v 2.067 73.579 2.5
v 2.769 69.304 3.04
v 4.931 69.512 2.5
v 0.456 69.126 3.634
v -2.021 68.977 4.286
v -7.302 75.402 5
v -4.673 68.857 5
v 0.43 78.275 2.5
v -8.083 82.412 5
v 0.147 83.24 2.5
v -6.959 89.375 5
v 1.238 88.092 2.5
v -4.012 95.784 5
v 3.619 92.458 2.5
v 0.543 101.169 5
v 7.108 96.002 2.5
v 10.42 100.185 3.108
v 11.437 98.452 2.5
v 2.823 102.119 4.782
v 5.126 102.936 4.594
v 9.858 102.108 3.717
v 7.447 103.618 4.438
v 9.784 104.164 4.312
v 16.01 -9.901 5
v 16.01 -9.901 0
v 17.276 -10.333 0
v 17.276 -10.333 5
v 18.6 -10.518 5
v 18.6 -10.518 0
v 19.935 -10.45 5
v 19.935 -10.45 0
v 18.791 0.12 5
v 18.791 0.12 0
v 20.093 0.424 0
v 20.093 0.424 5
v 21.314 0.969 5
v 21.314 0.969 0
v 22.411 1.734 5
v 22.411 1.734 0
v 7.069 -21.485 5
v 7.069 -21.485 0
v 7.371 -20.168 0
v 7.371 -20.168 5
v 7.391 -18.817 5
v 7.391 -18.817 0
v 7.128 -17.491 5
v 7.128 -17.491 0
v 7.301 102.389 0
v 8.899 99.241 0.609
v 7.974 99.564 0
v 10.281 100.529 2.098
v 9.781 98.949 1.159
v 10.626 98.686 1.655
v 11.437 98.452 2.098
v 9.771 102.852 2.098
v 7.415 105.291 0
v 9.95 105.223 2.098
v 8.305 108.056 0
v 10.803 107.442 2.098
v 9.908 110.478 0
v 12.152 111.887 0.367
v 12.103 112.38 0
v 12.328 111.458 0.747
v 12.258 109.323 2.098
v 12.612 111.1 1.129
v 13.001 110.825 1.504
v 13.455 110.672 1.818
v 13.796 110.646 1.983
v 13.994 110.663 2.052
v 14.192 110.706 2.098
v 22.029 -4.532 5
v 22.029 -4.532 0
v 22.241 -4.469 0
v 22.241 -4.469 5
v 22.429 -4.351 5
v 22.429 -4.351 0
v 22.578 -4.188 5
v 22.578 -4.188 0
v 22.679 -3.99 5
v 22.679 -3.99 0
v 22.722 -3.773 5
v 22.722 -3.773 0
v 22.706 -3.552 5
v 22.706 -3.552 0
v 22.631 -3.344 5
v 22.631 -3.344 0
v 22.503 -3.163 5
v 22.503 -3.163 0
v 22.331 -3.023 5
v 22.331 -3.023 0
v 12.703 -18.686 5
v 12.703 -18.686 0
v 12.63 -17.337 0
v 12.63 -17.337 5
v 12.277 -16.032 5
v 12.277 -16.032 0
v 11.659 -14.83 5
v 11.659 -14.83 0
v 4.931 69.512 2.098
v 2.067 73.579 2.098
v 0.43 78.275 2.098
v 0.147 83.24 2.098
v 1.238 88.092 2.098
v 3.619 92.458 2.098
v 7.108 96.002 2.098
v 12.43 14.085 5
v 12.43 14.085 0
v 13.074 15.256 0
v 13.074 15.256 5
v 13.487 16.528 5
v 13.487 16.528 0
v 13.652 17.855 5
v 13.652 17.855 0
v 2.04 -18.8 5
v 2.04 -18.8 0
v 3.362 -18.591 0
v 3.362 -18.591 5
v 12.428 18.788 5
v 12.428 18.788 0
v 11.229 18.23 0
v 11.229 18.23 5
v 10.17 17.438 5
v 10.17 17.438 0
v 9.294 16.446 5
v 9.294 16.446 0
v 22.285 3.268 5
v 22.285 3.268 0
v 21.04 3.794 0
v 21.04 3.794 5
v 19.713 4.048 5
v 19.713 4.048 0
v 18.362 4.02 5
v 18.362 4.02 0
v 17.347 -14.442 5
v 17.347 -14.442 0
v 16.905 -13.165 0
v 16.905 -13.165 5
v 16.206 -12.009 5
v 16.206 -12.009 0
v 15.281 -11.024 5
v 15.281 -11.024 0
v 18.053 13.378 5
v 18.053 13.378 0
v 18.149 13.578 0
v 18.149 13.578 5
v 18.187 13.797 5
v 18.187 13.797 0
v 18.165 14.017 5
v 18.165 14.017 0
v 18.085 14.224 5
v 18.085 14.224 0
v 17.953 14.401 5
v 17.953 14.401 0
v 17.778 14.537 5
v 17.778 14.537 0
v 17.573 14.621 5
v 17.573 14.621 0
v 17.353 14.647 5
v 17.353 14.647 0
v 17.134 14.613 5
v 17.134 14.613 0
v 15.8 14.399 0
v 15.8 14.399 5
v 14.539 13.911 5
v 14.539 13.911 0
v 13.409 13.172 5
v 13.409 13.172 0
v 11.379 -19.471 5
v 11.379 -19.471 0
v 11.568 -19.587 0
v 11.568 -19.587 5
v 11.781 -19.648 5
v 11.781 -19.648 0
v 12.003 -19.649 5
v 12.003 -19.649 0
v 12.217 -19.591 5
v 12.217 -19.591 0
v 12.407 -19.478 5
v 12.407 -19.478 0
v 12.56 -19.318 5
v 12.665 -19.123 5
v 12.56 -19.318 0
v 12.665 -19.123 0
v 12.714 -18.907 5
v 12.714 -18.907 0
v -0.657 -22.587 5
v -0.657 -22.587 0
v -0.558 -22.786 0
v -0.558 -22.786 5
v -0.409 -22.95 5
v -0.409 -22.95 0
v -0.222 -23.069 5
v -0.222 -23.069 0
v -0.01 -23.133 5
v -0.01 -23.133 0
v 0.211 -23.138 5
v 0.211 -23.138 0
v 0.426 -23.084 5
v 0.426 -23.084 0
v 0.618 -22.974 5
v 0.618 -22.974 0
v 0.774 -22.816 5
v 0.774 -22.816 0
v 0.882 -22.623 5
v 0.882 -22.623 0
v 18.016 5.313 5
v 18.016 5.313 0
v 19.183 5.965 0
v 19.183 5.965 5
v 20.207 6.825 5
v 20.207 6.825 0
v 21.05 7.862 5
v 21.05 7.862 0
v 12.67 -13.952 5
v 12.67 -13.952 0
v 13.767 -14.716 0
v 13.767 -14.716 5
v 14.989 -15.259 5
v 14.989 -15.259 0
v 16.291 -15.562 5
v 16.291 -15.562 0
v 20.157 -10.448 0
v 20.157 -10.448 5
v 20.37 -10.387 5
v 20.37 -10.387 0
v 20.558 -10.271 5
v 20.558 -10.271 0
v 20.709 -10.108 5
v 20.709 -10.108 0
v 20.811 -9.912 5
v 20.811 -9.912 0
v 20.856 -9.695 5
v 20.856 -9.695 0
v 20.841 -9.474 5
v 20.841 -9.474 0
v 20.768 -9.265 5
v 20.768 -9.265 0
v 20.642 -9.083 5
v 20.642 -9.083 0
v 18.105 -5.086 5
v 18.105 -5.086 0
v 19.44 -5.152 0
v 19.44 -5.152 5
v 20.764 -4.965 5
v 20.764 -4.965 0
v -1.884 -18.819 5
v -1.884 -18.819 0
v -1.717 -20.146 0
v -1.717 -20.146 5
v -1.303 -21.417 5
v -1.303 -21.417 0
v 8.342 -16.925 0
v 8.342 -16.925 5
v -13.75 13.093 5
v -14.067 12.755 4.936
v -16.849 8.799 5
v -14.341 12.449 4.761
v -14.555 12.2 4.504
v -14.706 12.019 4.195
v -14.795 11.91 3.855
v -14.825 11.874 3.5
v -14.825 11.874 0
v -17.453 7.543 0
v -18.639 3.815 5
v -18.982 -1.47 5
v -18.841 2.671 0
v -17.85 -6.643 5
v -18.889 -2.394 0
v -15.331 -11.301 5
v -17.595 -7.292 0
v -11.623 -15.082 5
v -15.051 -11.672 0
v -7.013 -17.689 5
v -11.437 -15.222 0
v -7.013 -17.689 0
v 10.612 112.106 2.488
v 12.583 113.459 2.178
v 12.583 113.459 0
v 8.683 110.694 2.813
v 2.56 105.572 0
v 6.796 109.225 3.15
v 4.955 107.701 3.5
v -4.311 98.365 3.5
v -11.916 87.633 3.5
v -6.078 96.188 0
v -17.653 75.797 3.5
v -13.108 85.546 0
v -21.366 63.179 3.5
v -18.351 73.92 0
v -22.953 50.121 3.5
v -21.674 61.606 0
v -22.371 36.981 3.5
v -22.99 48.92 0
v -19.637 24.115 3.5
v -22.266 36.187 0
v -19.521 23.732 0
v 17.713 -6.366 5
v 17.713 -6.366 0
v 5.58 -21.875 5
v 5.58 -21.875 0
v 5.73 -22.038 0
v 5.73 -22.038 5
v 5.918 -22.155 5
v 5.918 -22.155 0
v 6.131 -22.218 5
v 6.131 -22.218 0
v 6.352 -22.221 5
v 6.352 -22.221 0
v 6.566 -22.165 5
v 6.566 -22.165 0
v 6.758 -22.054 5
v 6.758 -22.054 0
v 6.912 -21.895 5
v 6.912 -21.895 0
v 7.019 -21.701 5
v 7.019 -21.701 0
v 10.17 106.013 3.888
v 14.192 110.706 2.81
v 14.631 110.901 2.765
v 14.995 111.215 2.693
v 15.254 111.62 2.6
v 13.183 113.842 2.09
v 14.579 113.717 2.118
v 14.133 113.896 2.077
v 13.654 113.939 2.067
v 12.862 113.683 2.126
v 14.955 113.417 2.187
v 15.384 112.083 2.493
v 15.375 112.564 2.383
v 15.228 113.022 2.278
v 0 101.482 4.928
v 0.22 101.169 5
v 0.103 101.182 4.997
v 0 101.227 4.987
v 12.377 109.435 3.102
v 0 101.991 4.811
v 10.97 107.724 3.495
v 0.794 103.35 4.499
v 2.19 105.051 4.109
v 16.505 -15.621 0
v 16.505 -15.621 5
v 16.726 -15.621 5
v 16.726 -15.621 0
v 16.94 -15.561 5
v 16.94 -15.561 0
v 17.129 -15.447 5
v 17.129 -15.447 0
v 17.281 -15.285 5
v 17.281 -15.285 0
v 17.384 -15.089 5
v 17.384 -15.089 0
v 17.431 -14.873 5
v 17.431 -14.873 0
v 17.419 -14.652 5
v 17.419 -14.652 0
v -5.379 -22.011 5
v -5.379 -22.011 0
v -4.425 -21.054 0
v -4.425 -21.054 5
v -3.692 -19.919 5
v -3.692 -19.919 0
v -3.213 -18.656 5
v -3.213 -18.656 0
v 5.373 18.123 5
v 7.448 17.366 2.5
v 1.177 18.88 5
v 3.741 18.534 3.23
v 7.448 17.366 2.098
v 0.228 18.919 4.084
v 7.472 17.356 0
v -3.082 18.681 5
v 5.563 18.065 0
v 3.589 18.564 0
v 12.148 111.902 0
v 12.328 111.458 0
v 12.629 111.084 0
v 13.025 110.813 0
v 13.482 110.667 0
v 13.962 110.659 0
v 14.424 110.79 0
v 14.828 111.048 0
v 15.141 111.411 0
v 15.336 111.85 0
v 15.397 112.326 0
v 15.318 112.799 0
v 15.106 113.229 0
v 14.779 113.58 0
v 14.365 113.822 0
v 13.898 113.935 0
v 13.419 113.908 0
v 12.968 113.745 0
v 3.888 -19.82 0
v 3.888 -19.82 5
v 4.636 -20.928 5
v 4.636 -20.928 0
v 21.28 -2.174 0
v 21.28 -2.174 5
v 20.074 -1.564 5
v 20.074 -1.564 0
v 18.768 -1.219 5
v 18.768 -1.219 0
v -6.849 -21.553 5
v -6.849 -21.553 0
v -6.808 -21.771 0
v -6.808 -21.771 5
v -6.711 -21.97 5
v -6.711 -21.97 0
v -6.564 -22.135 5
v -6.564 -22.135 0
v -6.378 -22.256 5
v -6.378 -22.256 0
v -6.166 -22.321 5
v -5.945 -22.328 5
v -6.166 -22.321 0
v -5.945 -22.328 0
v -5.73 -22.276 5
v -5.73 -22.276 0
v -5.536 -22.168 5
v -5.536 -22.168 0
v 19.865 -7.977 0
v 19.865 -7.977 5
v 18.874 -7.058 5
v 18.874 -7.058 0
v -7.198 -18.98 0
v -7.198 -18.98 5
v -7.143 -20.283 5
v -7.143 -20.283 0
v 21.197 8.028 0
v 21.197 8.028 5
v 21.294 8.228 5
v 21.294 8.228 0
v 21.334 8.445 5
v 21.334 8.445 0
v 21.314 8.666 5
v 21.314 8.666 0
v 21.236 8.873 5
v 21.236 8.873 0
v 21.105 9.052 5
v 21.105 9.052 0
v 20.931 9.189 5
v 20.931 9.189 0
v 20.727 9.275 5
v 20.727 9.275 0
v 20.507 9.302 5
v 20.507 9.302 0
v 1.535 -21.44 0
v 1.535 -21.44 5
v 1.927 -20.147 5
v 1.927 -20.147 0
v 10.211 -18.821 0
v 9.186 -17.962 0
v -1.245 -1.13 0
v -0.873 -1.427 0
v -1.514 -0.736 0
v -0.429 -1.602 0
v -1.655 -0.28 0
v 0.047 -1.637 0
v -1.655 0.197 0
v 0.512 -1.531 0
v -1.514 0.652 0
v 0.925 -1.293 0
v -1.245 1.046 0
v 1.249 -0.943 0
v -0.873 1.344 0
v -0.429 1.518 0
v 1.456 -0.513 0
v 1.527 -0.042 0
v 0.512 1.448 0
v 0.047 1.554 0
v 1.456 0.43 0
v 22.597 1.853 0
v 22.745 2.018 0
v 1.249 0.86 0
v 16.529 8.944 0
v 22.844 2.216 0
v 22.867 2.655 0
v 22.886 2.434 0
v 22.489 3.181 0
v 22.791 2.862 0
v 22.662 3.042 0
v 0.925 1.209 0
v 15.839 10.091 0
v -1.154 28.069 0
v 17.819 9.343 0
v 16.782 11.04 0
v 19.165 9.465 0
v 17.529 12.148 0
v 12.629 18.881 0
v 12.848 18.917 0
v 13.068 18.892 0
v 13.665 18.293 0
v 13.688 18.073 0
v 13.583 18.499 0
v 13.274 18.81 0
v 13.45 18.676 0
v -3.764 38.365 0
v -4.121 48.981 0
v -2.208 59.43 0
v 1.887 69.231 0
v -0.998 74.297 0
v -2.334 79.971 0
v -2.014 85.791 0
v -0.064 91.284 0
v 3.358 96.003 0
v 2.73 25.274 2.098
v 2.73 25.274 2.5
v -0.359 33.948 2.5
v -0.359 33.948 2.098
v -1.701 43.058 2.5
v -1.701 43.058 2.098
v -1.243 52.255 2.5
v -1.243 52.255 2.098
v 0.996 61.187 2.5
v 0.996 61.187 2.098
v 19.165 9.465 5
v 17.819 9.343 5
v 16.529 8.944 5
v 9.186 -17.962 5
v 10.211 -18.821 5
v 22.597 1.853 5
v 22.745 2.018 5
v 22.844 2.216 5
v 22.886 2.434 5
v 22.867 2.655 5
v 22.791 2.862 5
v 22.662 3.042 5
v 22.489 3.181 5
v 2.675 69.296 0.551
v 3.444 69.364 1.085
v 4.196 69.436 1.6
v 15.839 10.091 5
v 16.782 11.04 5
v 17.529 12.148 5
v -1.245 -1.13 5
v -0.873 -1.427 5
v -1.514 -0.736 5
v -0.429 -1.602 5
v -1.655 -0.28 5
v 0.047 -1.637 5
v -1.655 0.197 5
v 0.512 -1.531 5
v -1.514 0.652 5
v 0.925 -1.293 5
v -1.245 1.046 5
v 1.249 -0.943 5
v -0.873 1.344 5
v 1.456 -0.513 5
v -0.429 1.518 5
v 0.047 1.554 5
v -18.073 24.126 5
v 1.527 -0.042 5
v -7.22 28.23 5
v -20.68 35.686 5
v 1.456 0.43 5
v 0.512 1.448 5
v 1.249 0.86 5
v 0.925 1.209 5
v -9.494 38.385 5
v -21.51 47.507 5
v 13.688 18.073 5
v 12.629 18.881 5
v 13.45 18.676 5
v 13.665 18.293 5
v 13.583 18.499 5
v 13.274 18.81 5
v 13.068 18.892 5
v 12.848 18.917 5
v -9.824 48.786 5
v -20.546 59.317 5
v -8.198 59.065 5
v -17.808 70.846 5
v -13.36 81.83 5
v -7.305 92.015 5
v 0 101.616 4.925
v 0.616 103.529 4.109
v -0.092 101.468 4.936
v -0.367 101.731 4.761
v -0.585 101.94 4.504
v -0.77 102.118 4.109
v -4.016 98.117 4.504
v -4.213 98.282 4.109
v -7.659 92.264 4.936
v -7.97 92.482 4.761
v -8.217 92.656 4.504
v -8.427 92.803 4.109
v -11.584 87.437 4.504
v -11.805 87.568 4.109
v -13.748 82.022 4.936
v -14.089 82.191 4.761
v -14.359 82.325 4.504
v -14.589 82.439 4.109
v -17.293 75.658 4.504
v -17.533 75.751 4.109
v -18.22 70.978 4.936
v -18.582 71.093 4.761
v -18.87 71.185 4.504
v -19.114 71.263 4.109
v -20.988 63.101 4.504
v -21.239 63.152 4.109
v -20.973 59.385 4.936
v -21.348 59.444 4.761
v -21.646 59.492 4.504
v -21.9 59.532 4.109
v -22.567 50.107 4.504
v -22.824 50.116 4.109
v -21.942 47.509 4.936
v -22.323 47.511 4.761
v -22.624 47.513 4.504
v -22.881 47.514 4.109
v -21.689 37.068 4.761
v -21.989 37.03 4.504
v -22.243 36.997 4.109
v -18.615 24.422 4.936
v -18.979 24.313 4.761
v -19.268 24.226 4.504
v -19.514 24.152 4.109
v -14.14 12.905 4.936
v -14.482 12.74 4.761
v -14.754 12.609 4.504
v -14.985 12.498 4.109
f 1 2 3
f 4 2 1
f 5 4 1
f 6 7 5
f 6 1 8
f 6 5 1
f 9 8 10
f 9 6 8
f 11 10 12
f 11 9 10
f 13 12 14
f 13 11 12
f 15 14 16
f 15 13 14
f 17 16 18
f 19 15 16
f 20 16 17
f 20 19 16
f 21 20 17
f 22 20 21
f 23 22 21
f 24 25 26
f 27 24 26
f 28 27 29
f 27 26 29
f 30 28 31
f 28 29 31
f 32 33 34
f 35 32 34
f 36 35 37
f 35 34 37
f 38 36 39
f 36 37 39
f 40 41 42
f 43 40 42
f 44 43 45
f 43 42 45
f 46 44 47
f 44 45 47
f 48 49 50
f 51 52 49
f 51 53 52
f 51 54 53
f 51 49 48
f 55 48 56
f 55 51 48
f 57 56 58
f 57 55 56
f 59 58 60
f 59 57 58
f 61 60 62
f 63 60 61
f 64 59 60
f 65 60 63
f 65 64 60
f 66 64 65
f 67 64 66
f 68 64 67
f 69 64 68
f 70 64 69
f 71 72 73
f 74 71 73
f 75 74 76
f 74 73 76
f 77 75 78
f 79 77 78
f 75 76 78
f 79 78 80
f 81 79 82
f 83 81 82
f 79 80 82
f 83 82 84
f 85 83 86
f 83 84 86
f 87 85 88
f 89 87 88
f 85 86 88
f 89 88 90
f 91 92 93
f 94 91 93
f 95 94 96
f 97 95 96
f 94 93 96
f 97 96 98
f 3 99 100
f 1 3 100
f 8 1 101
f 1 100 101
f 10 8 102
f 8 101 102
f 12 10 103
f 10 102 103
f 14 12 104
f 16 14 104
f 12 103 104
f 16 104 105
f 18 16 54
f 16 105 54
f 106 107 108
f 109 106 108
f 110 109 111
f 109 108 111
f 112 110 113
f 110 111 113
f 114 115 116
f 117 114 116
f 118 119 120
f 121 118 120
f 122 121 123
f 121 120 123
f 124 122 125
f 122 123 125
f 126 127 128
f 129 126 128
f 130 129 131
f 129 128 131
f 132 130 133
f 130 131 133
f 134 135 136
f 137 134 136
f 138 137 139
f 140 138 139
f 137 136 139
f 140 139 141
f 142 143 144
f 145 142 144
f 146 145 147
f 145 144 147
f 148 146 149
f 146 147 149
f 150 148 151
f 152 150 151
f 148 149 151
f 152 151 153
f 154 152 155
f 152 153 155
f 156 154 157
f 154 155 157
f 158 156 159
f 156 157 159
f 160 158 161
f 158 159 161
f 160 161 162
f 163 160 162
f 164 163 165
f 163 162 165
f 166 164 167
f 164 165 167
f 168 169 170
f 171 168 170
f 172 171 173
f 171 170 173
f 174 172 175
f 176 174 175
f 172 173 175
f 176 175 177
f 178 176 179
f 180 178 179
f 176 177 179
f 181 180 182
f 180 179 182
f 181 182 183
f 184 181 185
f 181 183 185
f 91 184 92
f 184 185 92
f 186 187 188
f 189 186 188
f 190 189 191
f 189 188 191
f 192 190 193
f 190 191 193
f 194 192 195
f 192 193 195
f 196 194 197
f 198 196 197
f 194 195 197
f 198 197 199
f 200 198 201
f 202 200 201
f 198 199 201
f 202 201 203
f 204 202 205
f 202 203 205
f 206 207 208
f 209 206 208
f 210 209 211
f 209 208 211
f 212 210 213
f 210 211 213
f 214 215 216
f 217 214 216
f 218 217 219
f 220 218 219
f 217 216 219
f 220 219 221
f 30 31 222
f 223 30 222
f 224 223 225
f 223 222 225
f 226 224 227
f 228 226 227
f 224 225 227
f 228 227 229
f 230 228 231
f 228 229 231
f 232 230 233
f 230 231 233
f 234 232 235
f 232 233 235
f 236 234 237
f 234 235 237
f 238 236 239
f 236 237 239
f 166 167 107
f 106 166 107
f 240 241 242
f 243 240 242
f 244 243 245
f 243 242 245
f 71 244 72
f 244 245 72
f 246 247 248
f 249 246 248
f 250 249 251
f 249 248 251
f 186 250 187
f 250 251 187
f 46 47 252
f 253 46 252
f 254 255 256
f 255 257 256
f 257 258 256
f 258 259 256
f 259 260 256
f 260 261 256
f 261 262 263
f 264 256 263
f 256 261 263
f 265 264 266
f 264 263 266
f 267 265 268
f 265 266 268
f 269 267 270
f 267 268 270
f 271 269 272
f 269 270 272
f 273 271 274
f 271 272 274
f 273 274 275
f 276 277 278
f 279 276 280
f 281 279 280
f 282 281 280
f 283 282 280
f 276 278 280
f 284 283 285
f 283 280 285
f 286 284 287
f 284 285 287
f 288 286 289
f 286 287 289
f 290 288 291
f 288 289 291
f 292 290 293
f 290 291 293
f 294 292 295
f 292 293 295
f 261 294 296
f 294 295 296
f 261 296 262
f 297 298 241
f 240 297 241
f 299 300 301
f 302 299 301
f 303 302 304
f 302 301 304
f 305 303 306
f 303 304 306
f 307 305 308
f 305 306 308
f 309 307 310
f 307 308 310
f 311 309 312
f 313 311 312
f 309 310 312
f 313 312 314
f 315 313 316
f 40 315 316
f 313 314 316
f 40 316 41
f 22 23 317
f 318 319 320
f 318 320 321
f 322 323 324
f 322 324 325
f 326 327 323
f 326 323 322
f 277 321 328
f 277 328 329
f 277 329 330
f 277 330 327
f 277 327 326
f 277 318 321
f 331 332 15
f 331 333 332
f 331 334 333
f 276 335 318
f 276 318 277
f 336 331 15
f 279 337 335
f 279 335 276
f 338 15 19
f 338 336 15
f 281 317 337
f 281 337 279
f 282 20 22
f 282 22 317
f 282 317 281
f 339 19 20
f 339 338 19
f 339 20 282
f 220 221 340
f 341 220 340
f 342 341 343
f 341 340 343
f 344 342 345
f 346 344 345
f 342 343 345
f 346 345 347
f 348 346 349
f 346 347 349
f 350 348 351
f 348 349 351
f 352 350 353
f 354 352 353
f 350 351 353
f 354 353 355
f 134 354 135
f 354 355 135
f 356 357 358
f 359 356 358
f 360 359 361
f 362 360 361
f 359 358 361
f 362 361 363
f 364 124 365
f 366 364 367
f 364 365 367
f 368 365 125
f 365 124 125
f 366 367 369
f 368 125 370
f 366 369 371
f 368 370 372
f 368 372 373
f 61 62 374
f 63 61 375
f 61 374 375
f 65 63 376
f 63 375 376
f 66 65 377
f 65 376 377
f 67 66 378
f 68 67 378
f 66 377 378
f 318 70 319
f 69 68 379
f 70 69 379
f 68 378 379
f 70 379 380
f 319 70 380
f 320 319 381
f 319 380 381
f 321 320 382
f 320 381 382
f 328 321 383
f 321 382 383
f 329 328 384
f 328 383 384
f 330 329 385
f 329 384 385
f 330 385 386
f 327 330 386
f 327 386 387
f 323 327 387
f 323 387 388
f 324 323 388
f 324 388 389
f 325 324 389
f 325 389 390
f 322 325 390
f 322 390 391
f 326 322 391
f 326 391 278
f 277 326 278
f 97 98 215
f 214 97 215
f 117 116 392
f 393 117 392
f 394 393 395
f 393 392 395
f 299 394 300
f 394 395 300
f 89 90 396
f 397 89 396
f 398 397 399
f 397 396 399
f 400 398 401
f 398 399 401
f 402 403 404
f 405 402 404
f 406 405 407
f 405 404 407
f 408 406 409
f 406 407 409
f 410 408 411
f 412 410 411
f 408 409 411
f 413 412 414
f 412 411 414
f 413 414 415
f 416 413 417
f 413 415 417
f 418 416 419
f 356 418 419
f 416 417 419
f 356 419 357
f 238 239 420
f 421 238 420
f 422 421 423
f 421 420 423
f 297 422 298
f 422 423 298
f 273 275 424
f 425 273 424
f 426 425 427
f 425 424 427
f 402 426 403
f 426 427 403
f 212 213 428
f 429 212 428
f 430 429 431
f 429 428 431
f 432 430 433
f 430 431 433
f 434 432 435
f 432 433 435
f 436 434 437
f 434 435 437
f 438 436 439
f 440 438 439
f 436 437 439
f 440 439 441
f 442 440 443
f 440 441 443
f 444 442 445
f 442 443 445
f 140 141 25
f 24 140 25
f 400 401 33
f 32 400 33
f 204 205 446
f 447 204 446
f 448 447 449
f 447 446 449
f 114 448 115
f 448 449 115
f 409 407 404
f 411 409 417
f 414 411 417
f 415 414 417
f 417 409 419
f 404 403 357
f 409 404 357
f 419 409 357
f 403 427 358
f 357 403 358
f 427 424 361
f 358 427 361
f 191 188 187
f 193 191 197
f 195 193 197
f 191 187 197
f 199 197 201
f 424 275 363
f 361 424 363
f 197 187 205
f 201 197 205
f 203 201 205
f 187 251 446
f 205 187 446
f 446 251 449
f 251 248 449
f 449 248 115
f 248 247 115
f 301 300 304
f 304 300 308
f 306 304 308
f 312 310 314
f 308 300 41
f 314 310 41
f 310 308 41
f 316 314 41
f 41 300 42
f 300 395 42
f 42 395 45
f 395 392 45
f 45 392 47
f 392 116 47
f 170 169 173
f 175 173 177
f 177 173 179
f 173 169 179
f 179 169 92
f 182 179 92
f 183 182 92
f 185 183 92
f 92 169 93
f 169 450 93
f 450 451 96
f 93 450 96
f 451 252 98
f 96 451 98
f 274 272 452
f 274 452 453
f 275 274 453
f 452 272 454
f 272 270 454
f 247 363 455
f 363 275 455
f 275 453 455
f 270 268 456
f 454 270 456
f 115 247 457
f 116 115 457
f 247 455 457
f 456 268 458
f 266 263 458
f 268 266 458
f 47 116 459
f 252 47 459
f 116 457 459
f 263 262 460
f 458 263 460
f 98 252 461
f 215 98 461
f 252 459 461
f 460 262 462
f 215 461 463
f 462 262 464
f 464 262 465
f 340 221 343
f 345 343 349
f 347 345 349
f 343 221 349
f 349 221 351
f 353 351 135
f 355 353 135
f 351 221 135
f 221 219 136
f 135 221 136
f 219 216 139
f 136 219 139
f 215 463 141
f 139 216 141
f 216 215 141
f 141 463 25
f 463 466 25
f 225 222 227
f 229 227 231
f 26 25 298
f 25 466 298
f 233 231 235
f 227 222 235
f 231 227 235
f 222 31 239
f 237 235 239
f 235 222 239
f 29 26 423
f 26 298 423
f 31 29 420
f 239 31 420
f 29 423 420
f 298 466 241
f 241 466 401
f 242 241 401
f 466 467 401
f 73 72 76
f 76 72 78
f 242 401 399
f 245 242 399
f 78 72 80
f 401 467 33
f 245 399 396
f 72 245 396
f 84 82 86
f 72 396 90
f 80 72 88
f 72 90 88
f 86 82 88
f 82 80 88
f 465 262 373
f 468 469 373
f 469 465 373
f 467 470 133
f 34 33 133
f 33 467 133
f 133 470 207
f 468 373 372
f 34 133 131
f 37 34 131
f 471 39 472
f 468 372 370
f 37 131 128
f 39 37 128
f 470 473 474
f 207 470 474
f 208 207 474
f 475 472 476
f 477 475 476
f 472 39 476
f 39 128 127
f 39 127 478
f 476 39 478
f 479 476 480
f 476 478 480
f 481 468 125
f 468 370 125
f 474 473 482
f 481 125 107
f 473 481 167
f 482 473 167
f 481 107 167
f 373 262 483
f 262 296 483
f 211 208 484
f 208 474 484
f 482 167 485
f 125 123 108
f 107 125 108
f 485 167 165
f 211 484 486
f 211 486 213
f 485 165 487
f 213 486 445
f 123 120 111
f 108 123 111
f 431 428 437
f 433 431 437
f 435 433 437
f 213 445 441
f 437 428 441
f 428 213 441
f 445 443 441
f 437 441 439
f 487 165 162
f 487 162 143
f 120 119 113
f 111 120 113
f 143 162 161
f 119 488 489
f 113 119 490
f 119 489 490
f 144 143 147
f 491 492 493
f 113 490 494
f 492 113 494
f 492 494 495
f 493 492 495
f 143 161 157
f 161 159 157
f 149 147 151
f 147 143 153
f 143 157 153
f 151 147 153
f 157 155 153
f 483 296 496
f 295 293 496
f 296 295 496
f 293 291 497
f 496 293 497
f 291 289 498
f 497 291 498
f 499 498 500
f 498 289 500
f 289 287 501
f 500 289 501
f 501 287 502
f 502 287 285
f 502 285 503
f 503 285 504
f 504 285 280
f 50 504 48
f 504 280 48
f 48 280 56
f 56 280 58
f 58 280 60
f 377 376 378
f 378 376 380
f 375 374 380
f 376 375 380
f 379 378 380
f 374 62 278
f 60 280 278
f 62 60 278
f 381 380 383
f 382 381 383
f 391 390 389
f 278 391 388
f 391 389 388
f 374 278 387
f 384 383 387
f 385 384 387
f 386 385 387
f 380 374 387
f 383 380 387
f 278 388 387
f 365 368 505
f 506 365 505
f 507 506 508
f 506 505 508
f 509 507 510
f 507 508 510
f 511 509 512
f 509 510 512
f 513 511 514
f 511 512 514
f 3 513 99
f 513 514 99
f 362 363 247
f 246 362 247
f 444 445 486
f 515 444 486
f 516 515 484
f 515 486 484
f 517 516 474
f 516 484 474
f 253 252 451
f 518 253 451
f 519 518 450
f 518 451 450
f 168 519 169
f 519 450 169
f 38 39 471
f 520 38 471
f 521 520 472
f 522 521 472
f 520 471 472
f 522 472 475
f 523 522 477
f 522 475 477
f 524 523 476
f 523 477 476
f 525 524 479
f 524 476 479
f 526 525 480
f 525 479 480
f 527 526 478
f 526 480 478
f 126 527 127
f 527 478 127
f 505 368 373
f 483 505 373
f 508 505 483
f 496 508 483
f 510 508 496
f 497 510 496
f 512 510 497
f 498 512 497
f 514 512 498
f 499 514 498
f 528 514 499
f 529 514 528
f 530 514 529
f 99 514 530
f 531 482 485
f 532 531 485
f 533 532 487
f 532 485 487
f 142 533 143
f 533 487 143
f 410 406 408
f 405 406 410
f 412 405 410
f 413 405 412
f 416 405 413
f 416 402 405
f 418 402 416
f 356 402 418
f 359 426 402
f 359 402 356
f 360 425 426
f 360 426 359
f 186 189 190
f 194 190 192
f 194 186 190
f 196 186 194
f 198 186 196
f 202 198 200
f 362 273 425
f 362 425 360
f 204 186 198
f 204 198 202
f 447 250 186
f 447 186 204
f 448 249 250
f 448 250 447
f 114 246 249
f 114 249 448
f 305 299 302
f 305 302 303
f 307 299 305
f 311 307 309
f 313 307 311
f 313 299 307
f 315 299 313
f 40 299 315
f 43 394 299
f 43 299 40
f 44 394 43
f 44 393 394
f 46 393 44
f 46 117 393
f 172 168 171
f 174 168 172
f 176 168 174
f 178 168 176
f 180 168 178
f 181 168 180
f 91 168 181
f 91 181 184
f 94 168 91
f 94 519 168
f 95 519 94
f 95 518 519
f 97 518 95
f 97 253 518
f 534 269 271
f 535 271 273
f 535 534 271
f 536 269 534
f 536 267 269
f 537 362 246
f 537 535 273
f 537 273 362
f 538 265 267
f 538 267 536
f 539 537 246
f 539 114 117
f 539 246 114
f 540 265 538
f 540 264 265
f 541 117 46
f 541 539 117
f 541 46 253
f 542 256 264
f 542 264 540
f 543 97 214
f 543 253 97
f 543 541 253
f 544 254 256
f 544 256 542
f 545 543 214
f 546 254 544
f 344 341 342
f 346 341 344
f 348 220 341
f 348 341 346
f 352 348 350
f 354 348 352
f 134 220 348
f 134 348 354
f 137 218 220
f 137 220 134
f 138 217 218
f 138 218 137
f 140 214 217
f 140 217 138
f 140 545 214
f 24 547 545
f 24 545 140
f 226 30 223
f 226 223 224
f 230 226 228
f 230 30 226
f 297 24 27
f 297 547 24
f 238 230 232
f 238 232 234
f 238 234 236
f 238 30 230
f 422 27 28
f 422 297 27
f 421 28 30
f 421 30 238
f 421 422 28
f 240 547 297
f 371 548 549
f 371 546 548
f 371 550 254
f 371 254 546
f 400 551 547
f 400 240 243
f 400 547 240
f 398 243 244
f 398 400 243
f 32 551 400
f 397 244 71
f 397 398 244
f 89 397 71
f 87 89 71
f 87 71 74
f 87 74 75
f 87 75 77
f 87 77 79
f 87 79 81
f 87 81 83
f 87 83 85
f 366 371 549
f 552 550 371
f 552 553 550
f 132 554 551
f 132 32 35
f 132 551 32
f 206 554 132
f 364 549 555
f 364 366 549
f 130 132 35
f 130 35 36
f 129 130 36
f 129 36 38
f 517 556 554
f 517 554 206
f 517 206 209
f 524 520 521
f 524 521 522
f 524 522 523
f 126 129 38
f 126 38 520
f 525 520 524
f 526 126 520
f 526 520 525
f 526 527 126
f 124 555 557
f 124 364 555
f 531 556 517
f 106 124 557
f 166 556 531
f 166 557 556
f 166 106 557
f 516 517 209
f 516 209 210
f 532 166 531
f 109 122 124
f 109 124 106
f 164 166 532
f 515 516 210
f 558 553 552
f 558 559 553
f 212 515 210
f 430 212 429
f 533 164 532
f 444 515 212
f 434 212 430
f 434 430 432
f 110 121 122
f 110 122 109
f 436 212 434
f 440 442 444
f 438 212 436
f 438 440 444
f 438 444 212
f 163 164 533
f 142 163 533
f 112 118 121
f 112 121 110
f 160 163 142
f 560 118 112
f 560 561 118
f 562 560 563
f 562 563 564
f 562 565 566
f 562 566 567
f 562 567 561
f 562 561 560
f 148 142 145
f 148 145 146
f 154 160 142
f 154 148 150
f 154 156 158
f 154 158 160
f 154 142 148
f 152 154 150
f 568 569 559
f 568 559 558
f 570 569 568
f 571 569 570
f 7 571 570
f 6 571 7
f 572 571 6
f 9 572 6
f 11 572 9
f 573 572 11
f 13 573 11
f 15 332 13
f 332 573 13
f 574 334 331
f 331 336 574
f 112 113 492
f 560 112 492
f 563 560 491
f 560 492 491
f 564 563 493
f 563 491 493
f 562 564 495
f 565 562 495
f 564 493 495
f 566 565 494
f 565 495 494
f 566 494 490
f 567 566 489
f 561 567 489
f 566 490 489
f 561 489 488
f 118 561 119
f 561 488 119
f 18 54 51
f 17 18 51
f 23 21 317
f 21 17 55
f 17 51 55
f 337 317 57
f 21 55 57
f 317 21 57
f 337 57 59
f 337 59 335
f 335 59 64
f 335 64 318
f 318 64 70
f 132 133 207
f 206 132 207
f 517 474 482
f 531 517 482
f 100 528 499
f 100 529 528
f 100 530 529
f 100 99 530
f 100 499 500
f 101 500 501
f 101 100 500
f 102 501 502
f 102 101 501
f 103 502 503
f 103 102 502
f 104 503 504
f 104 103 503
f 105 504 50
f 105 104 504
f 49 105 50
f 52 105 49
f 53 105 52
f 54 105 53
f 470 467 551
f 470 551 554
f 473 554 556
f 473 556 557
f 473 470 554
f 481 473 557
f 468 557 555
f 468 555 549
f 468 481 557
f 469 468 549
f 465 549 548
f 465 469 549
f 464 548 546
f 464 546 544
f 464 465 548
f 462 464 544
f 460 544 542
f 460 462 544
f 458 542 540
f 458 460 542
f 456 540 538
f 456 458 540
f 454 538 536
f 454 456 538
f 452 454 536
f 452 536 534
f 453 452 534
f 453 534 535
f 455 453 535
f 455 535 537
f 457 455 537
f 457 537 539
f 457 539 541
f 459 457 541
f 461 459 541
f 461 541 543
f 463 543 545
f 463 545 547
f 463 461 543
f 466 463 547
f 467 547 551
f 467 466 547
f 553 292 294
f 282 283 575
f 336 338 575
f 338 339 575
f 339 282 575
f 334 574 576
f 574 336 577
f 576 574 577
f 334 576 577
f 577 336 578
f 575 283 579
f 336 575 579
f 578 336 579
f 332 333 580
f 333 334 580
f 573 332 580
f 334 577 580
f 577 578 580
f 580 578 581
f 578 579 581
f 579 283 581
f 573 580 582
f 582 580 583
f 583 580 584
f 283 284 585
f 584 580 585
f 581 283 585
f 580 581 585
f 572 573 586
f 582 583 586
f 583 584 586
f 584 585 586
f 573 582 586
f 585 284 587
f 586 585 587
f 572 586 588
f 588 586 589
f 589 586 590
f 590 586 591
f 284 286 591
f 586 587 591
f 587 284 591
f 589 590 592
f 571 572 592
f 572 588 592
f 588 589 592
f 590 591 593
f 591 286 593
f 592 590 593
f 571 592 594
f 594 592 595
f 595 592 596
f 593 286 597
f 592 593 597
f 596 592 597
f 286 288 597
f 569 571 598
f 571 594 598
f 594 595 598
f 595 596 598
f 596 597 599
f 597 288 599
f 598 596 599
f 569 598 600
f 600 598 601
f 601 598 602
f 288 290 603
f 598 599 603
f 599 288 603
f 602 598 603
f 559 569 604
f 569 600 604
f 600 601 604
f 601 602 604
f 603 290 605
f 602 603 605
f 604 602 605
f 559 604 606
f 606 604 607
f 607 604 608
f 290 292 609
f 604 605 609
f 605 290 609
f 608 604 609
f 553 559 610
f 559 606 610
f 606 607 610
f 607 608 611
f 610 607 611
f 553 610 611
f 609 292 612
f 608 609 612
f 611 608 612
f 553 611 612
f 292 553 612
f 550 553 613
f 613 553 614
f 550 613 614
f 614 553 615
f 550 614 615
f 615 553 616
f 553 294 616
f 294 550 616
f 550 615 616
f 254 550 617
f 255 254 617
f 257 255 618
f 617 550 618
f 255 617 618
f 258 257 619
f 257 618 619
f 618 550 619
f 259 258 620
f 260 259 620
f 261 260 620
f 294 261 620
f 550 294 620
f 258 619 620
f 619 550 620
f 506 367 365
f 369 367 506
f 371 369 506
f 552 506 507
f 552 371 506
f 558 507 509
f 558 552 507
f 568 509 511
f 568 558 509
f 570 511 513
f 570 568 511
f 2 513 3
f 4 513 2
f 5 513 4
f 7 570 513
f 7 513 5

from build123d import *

# Parameters (mm, degrees)
CROQUIS1_R                         = 1.6
BASE_PINZA_IZQ_DEPTH               = 5
FILO_PINZA_IZQ_FRENTE_SIZE         = 2.5
FILO_PINZA_IZQ_FRENTE_SIZE2        = 8.177131546
FILO_PINZA_IZQ_FRENTE_PART_2_SIZE  = 2.5
FILO_PINZA_IZQ_FRENTE_PART_2_SIZE2 = 8.177131546
FILO_PINZA_IZQ_TRASERA_SIZE        = 2.5
FILO_PINZA_IZQ_TRASERA_SIZE2       = 2.097749078
REDONDEO_PINZA_R                   = 1.5
FILO_PUNTA_DE_LA_PINZA_DEPTH       = 25


with BuildPart() as part:
    # Croquis1 → Base pinza Izq (new body)
    with BuildSketch(Plane.XY):
        with BuildLine():
            Line((-3.21263052, -18.655749546), (-1.883787412, -18.818911478))
            ThreePointArc((-1.883787412, -18.818911478), (-1.540097921, -20.791041192), (-0.656756643, -22.587461594))
            ThreePointArc((-0.656756643, -22.587461594), (0.100167827, -23.142972839), (0.881978822, -22.623069999))
            ThreePointArc((0.881978822, -22.623069999), (1.764835319, -20.803692071), (2.039711322, -18.800191429))
            Line((2.039711322, -18.800191429), (3.362050825, -18.590753944))
            ThreePointArc((3.362050825, -18.590753944), (4.236018988, -20.391753035), (5.580301692, -21.875101303))
            ThreePointArc((5.580301692, -21.875101303), (6.461023842, -22.200456325), (7.069244162, -21.485197324))
            ThreePointArc((7.069244162, -21.485197324), (7.416411774, -19.492950781), (7.128399927, -17.491296261))
            Line((7.128399927, -17.491296261), (8.341785446, -16.925485865))
            ThreePointArc((8.341785446, -16.925485865), (9.678320191, -18.415819032), (11.379393858, -19.471170374))
            ThreePointArc((11.379393858, -19.471170374), (12.315678324, -19.54116177), (12.70318512, -18.685962448))
            ThreePointArc((12.70318512, -18.685962448), (12.487766478, -16.675199795), (11.659180963, -14.830472801))
            Line((11.659180963, -14.830472801), (12.669603503, -13.952126564))
            ThreePointArc((12.669603503, -13.952126564), (14.365154653, -15.016327849), (16.291225864, -15.561917222))
            ThreePointArc((16.291225864, -15.561917222), (17.2105325, -15.371122295), (17.347303061, -14.442240596))
            ThreePointArc((17.347303061, -14.442240596), (16.585988071, -12.568748903), (15.281024883, -11.023872625))
            Line((15.281024883, -11.023872625), (16.010200333, -9.901041834))
            ThreePointArc((16.010200333, -9.901041834), (17.933402334, -10.45666053), (19.935245626, -10.450217521))
            ThreePointArc((19.935245626, -10.450217521), (20.766349673, -10.013418415), (20.641787479, -9.082820943))
            ThreePointArc((20.641787479, -9.082820943), (19.393560244, -7.491751991), (17.713323504, -6.366418202))
            Line((17.713323504, -6.366418202), (18.104757824, -5.086095979))
            ThreePointArc((18.104757824, -5.086095979), (20.10660751, -5.090084635), (22.029126852, -4.532108425))
            ThreePointArc((22.029126852, -4.532108425), (22.707637188, -3.883146854), (22.331392895, -3.022933143))
            ThreePointArc((22.331392895, -3.022933143), (20.692961828, -1.837557559), (18.76763058, -1.218953305))
            Line((18.76763058, -1.218953305), (18.790996766, 0.119665328))
            ThreePointArc((18.790996766, 0.119665328), (20.716397612, 0.66761574), (22.410642729, 1.733895046))
            ThreePointArc((22.410642729, 1.733895046), (22.883990674, 2.544739741), (22.285214414, 3.267923249))
            ThreePointArc((22.285214414, 3.267923249), (20.383519596, 3.955766587), (18.362261974, 4.019713947))
            Line((18.362261974, 4.019713947), (18.015749693, 5.312917357))
            ThreePointArc((18.015749693, 5.312917357), (19.715528173, 6.370353498), (21.0502347, 7.862324196))
            ThreePointArc((21.0502347, 7.862324196), (21.28174686, 8.772230519), (20.506829787, 9.30235402))
            ThreePointArc((20.506829787, 9.30235402), (18.489208082, 9.439373341), (16.528624271, 8.943709383))
            Line((16.528624271, 8.943709383), (15.83908012, 10.091304558))
            ThreePointArc((15.83908012, 10.091304558), (17.181543163, 11.576299862), (18.053302564, 13.378369123))
            ThreePointArc((18.053302564, 13.378369123), (18.025042163, 14.316840617), (17.134022223, 14.61283194))
            ThreePointArc((17.134022223, 14.61283194), (15.156792117, 14.188411454), (13.408781501, 13.171538539))
            Line((13.408781501, 13.171538539), (12.429629021, 14.084613696))
            ThreePointArc((12.429629021, 14.084613696), (13.310767144, 15.882115764), (13.652038458, 17.854665374))
            ThreePointArc((13.652038458, 17.854665374), (13.366195015, 18.748992453), (12.428105411, 18.787919193))
            ThreePointArc((12.428105411, 18.787919193), (10.679055036, 17.860974772), (9.294318125, 16.446440621))
            ThreePointArc((9.294318125, 16.446440621), (8.383848535, 16.931404874), (7.448354327, 17.366141334))
            ThreePointArc((7.448354327, 17.366141334), (-1.700590628, 43.058240857), (4.930525057, 69.51226657))
            ThreePointArc((4.930525057, 69.51226657), (0.52306005, 85.704285694), (11.436802268, 98.451734925))
            ThreePointArc((11.436802268, 98.451734925), (9.950168374, 105.222634605), (14.191781062, 110.70568892))
            ThreePointArc((14.191781062, 110.70568892), (15.17222045, 113.125017455), (12.583169371, 113.458523773))
            ThreePointArc((12.583169371, 113.458523773), (-20.259146899, 67.82971774), (-14.824550004, 11.873745454))
            ThreePointArc((-14.824550004, 11.873745454), (-18.406509969, -4.886141091), (-7.013193513, -17.689131926))
            ThreePointArc((-7.013193513, -17.689131926), (-7.200569296, -19.632587419), (-6.848555023, -21.553059987))
            ThreePointArc((-6.848555023, -21.553059987), (-6.274072174, -22.295688328), (-5.379242566, -22.011421958))
            ThreePointArc((-5.379242566, -22.011421958), (-4.029097912, -20.505871876), (-3.21263052, -18.655749546))
        make_face()
        with Locations((-0.072580898, -0.041793431)):
            Circle(CROQUIS1_R, mode=Mode.SUBTRACT)
    extrude(amount=BASE_PINZA_IZQ_DEPTH)

    # Filo Pinza Izq frente
    filo_pinza_izq_frente_edges = [part.edges().sort_by_distance(p)[0] for p in [
        (-1.700590628, 43.058240857, 5),
    ]]
    filo_pinza_izq_frente_side = [part.faces().sort_by_distance(p)[0] for p in [
        (-1.700590628, 43.058240857, 2.5),
    ]]
    chamfer(filo_pinza_izq_frente_edges, length=FILO_PINZA_IZQ_FRENTE_SIZE, length2=FILO_PINZA_IZQ_FRENTE_SIZE2, reference=filo_pinza_izq_frente_side[0])

    # Filo Pinza Izq frente part 2
    filo_pinza_izq_frente_part_2_edges = [part.edges().sort_by_distance(p)[0] for p in [
        (0.52306005, 85.704285694, 5),
    ]]
    filo_pinza_izq_frente_part_2_side = [part.faces().sort_by_distance(p)[0] for p in [
        (0.52306005, 85.704285694, 2.5),
    ]]
    chamfer(filo_pinza_izq_frente_part_2_edges, length=FILO_PINZA_IZQ_FRENTE_PART_2_SIZE, length2=FILO_PINZA_IZQ_FRENTE_PART_2_SIZE2, reference=filo_pinza_izq_frente_part_2_side[0])

    # Filo Pinza Izq trasera
    filo_pinza_izq_trasera_edges = [part.edges().sort_by_distance(p)[0] for p in [
        (9.950168374, 105.222634605, 0),
        (0.52306005, 85.704285694, 0),
        (-1.700590628, 43.058240857, 0),
    ]]
    filo_pinza_izq_trasera_side = [part.faces().sort_by_distance(p)[0] for p in [
        (-4.202450513, 33.436926911, 0),
    ]]
    chamfer(filo_pinza_izq_trasera_edges, length=FILO_PINZA_IZQ_TRASERA_SIZE, length2=FILO_PINZA_IZQ_TRASERA_SIZE2, reference=filo_pinza_izq_trasera_side[0])

    # Redondeo pinza
    redondeo_pinza_edges = [part.edges().sort_by_distance(p)[0] for p in [
        (-20.259146899, 67.82971774, 5),
    ]]
    fillet(redondeo_pinza_edges, radius=REDONDEO_PINZA_R)

    # Croquis2 → Filo punta de la pinza (cut)
    with BuildSketch(Plane(origin=(0, 0, 0), x_dir=(0, 0, -1), z_dir=(1, 0, 0))):
        Polygon((-5, 101.169328416), (-1.113038662, 118.093846631), (-5, 118.093846631), align=None)
    extrude(amount=FILO_PUNTA_DE_LA_PINZA_DEPTH, mode=Mode.SUBTRACT)


solid = part.part
